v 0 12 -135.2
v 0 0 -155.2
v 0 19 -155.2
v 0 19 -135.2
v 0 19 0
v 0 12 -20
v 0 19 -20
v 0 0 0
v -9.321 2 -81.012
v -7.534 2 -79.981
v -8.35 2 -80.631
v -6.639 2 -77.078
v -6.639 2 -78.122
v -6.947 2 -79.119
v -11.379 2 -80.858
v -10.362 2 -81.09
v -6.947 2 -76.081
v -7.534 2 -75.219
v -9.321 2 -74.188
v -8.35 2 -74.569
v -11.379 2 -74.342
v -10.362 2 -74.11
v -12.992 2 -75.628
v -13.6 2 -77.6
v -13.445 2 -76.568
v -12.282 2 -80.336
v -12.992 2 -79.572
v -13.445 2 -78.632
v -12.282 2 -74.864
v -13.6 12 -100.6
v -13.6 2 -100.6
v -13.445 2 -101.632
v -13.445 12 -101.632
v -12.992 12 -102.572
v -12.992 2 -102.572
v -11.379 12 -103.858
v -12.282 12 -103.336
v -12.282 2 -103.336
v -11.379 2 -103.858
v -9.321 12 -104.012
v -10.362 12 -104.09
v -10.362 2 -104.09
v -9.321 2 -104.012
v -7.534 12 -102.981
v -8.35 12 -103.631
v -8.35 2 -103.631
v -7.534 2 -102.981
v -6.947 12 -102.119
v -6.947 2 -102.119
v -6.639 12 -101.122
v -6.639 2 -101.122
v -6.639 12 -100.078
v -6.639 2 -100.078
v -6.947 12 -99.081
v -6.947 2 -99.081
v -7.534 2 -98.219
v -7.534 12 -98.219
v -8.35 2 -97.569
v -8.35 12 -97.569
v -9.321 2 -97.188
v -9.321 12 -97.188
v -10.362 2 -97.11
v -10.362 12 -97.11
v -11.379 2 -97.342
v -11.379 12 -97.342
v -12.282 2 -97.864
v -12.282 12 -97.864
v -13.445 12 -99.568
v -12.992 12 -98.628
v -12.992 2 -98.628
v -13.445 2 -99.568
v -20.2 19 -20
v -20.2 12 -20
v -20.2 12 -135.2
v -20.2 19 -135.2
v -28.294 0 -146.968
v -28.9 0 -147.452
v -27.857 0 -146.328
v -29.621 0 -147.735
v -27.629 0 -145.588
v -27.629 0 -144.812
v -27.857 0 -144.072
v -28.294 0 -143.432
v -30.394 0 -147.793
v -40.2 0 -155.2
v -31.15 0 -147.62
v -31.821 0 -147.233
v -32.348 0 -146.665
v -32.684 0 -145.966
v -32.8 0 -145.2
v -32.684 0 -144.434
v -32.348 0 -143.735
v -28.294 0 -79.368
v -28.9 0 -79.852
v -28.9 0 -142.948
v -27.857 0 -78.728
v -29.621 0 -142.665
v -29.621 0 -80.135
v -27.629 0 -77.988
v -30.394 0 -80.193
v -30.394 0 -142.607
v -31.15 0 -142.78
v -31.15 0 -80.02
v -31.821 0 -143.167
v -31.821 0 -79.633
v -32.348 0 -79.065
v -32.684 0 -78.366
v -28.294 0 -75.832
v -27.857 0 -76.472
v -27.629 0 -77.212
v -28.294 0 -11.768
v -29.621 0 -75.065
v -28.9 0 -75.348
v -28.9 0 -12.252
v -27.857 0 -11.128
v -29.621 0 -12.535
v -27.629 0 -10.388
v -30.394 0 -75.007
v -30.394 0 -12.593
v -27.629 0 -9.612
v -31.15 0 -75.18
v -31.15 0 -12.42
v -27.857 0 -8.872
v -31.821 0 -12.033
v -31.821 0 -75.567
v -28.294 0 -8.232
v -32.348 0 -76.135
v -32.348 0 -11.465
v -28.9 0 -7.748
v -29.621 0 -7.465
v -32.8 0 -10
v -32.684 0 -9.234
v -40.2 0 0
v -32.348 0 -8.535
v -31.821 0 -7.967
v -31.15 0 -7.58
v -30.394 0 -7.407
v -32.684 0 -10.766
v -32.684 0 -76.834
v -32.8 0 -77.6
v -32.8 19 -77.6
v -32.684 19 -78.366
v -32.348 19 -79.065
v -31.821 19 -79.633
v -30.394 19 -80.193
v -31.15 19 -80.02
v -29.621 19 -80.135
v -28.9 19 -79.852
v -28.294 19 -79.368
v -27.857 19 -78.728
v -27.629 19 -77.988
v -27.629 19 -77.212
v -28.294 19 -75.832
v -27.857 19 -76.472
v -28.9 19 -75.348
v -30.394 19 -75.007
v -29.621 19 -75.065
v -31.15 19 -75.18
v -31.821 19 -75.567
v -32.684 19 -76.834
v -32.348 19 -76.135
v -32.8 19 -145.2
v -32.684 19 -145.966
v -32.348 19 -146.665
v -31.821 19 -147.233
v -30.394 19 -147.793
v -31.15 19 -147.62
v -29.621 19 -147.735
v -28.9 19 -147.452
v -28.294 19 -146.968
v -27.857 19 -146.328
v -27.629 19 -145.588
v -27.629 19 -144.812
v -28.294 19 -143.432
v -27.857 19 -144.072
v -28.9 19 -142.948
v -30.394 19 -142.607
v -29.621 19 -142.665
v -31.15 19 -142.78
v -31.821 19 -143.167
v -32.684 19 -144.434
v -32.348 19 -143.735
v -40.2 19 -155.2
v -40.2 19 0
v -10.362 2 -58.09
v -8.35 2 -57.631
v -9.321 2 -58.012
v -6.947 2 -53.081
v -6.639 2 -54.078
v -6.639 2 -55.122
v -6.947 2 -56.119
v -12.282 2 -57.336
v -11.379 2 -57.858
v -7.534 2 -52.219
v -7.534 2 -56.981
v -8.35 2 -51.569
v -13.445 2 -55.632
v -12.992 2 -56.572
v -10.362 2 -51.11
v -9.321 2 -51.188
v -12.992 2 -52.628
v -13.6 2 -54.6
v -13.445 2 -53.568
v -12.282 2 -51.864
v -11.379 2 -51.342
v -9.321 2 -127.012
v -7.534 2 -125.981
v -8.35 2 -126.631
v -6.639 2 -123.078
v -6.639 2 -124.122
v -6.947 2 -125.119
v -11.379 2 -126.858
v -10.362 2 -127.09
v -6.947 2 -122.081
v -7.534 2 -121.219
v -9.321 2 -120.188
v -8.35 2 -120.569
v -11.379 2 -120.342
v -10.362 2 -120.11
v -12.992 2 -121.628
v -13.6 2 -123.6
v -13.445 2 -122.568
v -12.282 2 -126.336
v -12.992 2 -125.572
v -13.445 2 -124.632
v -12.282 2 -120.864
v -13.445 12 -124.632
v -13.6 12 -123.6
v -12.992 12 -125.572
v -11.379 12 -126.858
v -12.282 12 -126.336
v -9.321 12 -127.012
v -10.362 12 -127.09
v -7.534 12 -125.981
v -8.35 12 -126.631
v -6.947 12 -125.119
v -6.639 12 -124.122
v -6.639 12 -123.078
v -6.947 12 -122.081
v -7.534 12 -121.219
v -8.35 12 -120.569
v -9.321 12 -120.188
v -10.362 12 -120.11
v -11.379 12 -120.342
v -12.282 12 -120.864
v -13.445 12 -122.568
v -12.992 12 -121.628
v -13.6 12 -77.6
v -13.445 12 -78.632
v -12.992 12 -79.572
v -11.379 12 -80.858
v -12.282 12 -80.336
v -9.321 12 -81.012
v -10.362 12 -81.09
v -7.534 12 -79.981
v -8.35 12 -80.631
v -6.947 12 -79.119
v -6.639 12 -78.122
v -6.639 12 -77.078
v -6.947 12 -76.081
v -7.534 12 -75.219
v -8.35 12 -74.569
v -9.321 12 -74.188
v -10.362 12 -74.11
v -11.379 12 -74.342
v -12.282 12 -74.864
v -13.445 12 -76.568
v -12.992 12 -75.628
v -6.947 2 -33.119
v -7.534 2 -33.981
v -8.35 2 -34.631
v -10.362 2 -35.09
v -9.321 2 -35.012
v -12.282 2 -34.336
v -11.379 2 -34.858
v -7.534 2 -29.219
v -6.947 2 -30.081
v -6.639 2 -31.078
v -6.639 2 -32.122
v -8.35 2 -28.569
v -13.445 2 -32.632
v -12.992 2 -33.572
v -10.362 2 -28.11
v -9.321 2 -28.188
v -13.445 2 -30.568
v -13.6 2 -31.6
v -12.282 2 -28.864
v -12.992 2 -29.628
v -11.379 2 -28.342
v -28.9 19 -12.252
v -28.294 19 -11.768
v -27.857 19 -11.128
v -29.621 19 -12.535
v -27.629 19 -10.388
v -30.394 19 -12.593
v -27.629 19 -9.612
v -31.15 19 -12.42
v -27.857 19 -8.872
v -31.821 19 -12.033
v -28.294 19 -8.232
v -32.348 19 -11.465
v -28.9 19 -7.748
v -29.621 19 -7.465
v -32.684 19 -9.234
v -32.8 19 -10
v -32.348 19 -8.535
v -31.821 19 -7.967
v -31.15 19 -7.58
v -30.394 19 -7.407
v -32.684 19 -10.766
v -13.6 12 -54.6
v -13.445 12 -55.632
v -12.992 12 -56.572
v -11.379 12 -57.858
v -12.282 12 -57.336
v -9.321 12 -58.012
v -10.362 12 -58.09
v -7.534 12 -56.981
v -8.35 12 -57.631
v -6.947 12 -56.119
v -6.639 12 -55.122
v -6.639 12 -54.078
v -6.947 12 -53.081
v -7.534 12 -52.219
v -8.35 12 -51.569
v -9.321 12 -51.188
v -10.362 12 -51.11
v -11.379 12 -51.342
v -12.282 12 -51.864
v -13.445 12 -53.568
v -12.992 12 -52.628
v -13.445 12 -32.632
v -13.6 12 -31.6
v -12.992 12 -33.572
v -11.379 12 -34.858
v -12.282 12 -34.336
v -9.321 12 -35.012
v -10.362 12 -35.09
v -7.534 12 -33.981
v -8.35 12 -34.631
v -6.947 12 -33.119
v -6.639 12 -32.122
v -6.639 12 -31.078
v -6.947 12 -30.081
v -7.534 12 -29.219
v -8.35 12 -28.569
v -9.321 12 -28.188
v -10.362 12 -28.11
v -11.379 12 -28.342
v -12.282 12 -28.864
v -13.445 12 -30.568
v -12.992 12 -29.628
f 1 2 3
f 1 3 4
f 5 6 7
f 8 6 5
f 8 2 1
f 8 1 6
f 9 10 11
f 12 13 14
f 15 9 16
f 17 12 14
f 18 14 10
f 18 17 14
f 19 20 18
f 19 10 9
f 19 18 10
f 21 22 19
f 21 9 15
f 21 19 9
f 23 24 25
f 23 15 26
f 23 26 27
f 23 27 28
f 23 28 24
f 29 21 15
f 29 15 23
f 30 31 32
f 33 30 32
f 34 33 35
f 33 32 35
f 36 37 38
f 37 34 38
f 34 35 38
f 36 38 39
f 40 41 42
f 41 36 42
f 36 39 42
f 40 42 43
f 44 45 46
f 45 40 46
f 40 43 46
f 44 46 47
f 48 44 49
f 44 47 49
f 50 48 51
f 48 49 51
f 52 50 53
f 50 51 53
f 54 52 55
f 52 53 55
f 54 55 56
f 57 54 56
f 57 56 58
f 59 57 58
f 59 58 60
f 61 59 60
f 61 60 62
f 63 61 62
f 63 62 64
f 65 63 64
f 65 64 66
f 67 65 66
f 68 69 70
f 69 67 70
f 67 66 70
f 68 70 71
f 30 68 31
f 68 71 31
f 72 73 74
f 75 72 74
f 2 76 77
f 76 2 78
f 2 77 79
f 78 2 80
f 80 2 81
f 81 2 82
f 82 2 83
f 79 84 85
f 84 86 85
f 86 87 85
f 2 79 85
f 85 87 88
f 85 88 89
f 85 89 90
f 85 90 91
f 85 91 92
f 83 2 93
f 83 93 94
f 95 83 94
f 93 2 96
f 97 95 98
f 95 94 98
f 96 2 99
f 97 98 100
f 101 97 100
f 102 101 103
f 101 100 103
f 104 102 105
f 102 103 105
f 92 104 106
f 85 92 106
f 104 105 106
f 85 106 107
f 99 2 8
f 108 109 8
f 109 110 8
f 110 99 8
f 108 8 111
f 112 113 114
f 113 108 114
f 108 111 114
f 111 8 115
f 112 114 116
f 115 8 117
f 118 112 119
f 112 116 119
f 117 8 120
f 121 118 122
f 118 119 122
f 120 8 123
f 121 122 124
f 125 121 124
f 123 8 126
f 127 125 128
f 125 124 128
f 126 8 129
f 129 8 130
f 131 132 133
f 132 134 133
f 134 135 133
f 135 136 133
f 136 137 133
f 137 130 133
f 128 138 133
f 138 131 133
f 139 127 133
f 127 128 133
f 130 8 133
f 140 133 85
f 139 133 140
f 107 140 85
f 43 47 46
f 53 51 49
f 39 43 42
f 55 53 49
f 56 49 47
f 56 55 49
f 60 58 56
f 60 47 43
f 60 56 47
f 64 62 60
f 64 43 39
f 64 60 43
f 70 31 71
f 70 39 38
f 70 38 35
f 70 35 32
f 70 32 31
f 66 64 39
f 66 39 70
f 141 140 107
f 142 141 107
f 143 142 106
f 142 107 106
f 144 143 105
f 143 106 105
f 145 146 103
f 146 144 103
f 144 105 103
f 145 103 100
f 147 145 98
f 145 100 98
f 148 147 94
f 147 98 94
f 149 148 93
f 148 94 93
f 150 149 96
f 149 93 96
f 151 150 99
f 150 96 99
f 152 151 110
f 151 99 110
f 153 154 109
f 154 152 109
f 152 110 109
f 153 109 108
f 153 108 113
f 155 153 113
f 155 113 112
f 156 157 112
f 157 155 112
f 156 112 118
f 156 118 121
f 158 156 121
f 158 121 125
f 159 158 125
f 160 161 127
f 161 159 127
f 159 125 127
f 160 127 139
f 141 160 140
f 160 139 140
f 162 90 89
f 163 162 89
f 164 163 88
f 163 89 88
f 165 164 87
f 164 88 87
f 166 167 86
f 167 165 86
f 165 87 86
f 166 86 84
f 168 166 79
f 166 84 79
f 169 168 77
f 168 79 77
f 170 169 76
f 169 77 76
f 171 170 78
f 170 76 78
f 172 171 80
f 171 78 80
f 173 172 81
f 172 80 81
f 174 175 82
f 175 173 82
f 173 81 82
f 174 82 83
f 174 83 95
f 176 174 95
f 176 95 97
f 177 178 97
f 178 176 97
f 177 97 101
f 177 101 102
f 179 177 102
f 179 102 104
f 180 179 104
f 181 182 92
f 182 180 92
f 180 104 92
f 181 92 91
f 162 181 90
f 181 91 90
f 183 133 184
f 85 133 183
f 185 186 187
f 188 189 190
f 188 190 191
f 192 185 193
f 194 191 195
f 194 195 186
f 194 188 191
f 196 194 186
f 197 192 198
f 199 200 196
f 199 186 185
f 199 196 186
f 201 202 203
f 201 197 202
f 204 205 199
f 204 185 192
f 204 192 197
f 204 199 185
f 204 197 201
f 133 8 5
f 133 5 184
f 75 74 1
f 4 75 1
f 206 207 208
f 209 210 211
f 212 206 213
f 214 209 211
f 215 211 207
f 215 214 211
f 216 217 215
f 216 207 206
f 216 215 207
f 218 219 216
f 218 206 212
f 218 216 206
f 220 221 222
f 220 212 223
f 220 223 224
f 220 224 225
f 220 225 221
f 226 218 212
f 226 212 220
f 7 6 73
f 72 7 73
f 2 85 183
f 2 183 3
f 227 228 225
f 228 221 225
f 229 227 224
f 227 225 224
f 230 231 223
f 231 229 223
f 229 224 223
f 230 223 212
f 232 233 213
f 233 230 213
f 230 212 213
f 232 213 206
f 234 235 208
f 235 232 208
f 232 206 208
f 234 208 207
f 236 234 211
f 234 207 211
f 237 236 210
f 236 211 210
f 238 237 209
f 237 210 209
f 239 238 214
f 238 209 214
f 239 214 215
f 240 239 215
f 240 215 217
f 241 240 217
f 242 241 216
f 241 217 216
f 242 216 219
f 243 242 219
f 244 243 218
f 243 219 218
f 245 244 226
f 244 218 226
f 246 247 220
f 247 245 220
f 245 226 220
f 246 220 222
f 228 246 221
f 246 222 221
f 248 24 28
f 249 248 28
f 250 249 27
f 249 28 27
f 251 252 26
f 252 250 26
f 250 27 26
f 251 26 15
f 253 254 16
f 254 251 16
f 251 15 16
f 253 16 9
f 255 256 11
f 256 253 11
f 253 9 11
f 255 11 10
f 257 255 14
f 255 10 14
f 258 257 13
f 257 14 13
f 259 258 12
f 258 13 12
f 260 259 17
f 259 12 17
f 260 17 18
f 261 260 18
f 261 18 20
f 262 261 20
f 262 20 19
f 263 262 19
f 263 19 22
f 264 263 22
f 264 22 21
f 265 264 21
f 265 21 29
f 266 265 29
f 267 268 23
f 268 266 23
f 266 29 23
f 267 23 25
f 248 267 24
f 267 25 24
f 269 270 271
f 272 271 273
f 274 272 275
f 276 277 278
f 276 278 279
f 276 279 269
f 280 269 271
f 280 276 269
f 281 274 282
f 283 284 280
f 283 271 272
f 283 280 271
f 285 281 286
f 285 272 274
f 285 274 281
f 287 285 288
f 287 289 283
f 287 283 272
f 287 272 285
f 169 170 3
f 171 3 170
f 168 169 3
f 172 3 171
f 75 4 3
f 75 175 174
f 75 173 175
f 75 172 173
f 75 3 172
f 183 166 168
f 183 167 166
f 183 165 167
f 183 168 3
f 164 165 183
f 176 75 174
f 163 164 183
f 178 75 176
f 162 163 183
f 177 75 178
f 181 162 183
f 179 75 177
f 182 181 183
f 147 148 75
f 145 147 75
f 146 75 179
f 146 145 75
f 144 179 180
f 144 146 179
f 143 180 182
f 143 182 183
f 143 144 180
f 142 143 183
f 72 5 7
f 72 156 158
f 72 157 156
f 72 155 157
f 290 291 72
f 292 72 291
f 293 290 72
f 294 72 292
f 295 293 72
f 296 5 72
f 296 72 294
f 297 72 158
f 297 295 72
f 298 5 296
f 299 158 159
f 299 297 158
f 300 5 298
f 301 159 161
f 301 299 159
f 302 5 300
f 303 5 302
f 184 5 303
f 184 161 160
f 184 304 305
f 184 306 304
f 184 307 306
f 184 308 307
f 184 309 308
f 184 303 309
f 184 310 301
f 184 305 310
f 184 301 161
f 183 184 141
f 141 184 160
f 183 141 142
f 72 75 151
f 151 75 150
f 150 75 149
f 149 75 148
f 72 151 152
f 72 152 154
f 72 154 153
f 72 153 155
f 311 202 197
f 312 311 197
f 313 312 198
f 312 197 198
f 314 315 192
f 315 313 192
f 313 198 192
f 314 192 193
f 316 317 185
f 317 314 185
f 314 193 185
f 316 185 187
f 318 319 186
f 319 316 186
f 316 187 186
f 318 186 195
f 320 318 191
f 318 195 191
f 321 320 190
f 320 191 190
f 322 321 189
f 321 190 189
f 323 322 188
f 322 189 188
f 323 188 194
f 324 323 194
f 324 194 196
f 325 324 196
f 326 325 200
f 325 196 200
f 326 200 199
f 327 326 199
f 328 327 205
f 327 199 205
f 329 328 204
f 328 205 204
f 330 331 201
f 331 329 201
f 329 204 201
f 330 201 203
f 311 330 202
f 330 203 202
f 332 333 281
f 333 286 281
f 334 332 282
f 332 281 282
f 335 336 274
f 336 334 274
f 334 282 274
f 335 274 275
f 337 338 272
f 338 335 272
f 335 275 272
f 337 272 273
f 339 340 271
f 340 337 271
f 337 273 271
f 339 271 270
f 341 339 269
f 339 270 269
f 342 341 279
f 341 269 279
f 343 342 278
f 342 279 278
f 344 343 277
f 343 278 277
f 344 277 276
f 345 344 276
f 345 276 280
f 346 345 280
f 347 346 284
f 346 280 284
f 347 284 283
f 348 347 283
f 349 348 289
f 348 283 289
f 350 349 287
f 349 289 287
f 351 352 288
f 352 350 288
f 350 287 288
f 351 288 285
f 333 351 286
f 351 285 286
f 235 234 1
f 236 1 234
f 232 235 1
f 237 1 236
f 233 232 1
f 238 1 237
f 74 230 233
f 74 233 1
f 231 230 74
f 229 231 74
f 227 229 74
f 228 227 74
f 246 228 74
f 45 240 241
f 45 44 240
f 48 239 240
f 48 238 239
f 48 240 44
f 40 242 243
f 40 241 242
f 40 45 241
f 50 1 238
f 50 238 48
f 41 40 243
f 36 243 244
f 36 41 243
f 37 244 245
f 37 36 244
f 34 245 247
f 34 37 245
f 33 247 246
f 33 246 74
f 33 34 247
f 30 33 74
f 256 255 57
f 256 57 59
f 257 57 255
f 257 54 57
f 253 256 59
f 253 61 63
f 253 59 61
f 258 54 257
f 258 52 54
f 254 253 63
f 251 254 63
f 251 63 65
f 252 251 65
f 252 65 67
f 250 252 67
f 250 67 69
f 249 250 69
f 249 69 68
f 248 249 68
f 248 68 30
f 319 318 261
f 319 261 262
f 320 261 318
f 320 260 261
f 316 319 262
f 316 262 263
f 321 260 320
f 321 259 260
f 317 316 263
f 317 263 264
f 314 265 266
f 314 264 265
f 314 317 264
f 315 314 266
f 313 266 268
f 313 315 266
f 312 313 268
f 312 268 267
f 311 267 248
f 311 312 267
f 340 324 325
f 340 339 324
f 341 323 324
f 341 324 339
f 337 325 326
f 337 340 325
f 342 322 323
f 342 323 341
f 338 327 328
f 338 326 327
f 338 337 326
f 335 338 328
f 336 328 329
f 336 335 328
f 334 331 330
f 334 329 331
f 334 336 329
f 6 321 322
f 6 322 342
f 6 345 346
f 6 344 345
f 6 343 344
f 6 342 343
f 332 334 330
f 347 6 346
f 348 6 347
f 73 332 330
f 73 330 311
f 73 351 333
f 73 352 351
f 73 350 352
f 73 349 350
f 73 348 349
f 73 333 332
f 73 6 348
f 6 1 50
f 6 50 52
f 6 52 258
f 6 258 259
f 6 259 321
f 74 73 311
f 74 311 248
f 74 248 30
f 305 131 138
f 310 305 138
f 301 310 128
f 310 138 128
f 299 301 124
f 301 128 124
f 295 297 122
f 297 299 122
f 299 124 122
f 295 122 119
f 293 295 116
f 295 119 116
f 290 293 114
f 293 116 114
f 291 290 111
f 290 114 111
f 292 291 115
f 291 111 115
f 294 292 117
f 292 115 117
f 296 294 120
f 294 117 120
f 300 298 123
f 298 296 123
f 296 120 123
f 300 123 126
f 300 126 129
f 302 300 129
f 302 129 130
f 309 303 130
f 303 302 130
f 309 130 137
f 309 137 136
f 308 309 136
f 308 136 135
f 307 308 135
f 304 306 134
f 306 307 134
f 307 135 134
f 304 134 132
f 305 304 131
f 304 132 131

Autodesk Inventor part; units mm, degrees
ref_plane "YZ Plane" through (0, 0, 0) normal (1, 0, 0) x (0, 1, 0)
ref_plane "XZ Plane" through (0, 0, 0) normal (0, 1, 0) x (-1, 0, 0)
ref_plane "XY Plane" through (0, 0, 0) normal (0, 0, 1) x (1, 0, 0)
sketch "Sketch1" plane through (0, 0, 0) normal (0, 1, 0) x (-1, 0, 0)
  line L0 (0, 0) -> (40.2, 0)
  line L1 (40.2, 0) -> (40.2, -155.2)
  line L2 (40.2, -155.2) -> (0, -155.2)
  line L3 (0, -155.2) -> (0, 0)
  line L4 (0, -20) -> (20.2, -20)
  line L5 (20.2, -20) -> (20.2, -135.2)
  line L6 (20.2, -135.2) -> (0, -135.2)
  line L7 (0, -135.2) -> (0, -20)
  line L8 (10.1, -135.2) -> (10.1, -20) construction
  line L9 (20.2, -77.6) -> (0, -77.6) construction
  circle A0 centre (10.1, -77.6) radius 3.5
  line L10 (0, -54.6) -> (20.2, -54.6) construction
  line L11 (20.2, -31.6) -> (0, -31.6) construction
  circle A1 centre (10.1, -54.6) radius 3.5
  circle A2 centre (10.1, -31.6) radius 3.5
  circle A3 centre (10.1, -100.6) radius 3.5
  circle A4 centre (10.1, -123.6) radius 3.5
  line L12 (40.2, -155.2) -> (20.2, -135.2) construction
  line L13 (30.2, -155.2) -> (30.2, 0) construction
  line L14 (20.2, -20) -> (40.2, 0) construction
  circle A5 centre (30.2, -145.2) radius 2.6
  circle A6 centre (30.2, -10) radius 2.6
  circle A7 centre (30.2, -77.6) radius 2.6
  point P0 (0, -135.2)
  dimension "d0" = 115.2
  dimension "d1" = 20.2
  dimension "d2" = 7
  dimension "d3" = 23
  dimension "d4" = 23
  dimension "d11" = 20
  dimension "d12" = 20
  dimension "d13" = 20
  dimension "d14" = 5.2
extrude "Extrusion1" add sketch "Sketch1" along normal blind 12 contours L4 L5 L6 L3
extrude "Extrusion2" add sketch "Sketch1" along normal blind 2 contours A0 | A1 | A2 | A3 | A4
extrude "Extrusion3" add sketch "Sketch1" along normal blind 19 contours L0 L1 L2 L3 L6 L5 L4
equation "\"d1\" = screwTabWidth + tolerance"
equation "\"d2\" = insertDiameter"
equation "\"d11\" = screwTabWidth"
equation "\"d12\" = screwTabWidth"
equation "\"d13\" = screwTabWidth"
equation "\"d14\" = screwDiameter + tolerance"
equation "\"d5\" = insertPadding + insertLength"
equation "\"d7\" = insertPadding"
equation "\"d9\" = insertLength + insertPadding + baseThickness"
equation "\"insertDiameter\" = 7"
equation "\"insertLength\" = 10"
equation "\"insertPadding\" = 2"
equation "\"tolerance\" = 0.2"
equation "\"cellSpacing_1\" = 1"
equation "\"screwDiameter_1\" = 5"
equation "\"baseThickness_1\" = 7"
equation "\"tabThickness_1\" = 0.8"
equation "\"batteryBoxWidth\" = 162"
equation "\"sheetMetalThickness\" = 3.175"
equation "\"screwTabWidth\" = 20"
equation "\"screwDiameter\" = 5"
equation "\"baseThickness\" = 7"
properties part number "CO-1-1-CellSpacerMount"
